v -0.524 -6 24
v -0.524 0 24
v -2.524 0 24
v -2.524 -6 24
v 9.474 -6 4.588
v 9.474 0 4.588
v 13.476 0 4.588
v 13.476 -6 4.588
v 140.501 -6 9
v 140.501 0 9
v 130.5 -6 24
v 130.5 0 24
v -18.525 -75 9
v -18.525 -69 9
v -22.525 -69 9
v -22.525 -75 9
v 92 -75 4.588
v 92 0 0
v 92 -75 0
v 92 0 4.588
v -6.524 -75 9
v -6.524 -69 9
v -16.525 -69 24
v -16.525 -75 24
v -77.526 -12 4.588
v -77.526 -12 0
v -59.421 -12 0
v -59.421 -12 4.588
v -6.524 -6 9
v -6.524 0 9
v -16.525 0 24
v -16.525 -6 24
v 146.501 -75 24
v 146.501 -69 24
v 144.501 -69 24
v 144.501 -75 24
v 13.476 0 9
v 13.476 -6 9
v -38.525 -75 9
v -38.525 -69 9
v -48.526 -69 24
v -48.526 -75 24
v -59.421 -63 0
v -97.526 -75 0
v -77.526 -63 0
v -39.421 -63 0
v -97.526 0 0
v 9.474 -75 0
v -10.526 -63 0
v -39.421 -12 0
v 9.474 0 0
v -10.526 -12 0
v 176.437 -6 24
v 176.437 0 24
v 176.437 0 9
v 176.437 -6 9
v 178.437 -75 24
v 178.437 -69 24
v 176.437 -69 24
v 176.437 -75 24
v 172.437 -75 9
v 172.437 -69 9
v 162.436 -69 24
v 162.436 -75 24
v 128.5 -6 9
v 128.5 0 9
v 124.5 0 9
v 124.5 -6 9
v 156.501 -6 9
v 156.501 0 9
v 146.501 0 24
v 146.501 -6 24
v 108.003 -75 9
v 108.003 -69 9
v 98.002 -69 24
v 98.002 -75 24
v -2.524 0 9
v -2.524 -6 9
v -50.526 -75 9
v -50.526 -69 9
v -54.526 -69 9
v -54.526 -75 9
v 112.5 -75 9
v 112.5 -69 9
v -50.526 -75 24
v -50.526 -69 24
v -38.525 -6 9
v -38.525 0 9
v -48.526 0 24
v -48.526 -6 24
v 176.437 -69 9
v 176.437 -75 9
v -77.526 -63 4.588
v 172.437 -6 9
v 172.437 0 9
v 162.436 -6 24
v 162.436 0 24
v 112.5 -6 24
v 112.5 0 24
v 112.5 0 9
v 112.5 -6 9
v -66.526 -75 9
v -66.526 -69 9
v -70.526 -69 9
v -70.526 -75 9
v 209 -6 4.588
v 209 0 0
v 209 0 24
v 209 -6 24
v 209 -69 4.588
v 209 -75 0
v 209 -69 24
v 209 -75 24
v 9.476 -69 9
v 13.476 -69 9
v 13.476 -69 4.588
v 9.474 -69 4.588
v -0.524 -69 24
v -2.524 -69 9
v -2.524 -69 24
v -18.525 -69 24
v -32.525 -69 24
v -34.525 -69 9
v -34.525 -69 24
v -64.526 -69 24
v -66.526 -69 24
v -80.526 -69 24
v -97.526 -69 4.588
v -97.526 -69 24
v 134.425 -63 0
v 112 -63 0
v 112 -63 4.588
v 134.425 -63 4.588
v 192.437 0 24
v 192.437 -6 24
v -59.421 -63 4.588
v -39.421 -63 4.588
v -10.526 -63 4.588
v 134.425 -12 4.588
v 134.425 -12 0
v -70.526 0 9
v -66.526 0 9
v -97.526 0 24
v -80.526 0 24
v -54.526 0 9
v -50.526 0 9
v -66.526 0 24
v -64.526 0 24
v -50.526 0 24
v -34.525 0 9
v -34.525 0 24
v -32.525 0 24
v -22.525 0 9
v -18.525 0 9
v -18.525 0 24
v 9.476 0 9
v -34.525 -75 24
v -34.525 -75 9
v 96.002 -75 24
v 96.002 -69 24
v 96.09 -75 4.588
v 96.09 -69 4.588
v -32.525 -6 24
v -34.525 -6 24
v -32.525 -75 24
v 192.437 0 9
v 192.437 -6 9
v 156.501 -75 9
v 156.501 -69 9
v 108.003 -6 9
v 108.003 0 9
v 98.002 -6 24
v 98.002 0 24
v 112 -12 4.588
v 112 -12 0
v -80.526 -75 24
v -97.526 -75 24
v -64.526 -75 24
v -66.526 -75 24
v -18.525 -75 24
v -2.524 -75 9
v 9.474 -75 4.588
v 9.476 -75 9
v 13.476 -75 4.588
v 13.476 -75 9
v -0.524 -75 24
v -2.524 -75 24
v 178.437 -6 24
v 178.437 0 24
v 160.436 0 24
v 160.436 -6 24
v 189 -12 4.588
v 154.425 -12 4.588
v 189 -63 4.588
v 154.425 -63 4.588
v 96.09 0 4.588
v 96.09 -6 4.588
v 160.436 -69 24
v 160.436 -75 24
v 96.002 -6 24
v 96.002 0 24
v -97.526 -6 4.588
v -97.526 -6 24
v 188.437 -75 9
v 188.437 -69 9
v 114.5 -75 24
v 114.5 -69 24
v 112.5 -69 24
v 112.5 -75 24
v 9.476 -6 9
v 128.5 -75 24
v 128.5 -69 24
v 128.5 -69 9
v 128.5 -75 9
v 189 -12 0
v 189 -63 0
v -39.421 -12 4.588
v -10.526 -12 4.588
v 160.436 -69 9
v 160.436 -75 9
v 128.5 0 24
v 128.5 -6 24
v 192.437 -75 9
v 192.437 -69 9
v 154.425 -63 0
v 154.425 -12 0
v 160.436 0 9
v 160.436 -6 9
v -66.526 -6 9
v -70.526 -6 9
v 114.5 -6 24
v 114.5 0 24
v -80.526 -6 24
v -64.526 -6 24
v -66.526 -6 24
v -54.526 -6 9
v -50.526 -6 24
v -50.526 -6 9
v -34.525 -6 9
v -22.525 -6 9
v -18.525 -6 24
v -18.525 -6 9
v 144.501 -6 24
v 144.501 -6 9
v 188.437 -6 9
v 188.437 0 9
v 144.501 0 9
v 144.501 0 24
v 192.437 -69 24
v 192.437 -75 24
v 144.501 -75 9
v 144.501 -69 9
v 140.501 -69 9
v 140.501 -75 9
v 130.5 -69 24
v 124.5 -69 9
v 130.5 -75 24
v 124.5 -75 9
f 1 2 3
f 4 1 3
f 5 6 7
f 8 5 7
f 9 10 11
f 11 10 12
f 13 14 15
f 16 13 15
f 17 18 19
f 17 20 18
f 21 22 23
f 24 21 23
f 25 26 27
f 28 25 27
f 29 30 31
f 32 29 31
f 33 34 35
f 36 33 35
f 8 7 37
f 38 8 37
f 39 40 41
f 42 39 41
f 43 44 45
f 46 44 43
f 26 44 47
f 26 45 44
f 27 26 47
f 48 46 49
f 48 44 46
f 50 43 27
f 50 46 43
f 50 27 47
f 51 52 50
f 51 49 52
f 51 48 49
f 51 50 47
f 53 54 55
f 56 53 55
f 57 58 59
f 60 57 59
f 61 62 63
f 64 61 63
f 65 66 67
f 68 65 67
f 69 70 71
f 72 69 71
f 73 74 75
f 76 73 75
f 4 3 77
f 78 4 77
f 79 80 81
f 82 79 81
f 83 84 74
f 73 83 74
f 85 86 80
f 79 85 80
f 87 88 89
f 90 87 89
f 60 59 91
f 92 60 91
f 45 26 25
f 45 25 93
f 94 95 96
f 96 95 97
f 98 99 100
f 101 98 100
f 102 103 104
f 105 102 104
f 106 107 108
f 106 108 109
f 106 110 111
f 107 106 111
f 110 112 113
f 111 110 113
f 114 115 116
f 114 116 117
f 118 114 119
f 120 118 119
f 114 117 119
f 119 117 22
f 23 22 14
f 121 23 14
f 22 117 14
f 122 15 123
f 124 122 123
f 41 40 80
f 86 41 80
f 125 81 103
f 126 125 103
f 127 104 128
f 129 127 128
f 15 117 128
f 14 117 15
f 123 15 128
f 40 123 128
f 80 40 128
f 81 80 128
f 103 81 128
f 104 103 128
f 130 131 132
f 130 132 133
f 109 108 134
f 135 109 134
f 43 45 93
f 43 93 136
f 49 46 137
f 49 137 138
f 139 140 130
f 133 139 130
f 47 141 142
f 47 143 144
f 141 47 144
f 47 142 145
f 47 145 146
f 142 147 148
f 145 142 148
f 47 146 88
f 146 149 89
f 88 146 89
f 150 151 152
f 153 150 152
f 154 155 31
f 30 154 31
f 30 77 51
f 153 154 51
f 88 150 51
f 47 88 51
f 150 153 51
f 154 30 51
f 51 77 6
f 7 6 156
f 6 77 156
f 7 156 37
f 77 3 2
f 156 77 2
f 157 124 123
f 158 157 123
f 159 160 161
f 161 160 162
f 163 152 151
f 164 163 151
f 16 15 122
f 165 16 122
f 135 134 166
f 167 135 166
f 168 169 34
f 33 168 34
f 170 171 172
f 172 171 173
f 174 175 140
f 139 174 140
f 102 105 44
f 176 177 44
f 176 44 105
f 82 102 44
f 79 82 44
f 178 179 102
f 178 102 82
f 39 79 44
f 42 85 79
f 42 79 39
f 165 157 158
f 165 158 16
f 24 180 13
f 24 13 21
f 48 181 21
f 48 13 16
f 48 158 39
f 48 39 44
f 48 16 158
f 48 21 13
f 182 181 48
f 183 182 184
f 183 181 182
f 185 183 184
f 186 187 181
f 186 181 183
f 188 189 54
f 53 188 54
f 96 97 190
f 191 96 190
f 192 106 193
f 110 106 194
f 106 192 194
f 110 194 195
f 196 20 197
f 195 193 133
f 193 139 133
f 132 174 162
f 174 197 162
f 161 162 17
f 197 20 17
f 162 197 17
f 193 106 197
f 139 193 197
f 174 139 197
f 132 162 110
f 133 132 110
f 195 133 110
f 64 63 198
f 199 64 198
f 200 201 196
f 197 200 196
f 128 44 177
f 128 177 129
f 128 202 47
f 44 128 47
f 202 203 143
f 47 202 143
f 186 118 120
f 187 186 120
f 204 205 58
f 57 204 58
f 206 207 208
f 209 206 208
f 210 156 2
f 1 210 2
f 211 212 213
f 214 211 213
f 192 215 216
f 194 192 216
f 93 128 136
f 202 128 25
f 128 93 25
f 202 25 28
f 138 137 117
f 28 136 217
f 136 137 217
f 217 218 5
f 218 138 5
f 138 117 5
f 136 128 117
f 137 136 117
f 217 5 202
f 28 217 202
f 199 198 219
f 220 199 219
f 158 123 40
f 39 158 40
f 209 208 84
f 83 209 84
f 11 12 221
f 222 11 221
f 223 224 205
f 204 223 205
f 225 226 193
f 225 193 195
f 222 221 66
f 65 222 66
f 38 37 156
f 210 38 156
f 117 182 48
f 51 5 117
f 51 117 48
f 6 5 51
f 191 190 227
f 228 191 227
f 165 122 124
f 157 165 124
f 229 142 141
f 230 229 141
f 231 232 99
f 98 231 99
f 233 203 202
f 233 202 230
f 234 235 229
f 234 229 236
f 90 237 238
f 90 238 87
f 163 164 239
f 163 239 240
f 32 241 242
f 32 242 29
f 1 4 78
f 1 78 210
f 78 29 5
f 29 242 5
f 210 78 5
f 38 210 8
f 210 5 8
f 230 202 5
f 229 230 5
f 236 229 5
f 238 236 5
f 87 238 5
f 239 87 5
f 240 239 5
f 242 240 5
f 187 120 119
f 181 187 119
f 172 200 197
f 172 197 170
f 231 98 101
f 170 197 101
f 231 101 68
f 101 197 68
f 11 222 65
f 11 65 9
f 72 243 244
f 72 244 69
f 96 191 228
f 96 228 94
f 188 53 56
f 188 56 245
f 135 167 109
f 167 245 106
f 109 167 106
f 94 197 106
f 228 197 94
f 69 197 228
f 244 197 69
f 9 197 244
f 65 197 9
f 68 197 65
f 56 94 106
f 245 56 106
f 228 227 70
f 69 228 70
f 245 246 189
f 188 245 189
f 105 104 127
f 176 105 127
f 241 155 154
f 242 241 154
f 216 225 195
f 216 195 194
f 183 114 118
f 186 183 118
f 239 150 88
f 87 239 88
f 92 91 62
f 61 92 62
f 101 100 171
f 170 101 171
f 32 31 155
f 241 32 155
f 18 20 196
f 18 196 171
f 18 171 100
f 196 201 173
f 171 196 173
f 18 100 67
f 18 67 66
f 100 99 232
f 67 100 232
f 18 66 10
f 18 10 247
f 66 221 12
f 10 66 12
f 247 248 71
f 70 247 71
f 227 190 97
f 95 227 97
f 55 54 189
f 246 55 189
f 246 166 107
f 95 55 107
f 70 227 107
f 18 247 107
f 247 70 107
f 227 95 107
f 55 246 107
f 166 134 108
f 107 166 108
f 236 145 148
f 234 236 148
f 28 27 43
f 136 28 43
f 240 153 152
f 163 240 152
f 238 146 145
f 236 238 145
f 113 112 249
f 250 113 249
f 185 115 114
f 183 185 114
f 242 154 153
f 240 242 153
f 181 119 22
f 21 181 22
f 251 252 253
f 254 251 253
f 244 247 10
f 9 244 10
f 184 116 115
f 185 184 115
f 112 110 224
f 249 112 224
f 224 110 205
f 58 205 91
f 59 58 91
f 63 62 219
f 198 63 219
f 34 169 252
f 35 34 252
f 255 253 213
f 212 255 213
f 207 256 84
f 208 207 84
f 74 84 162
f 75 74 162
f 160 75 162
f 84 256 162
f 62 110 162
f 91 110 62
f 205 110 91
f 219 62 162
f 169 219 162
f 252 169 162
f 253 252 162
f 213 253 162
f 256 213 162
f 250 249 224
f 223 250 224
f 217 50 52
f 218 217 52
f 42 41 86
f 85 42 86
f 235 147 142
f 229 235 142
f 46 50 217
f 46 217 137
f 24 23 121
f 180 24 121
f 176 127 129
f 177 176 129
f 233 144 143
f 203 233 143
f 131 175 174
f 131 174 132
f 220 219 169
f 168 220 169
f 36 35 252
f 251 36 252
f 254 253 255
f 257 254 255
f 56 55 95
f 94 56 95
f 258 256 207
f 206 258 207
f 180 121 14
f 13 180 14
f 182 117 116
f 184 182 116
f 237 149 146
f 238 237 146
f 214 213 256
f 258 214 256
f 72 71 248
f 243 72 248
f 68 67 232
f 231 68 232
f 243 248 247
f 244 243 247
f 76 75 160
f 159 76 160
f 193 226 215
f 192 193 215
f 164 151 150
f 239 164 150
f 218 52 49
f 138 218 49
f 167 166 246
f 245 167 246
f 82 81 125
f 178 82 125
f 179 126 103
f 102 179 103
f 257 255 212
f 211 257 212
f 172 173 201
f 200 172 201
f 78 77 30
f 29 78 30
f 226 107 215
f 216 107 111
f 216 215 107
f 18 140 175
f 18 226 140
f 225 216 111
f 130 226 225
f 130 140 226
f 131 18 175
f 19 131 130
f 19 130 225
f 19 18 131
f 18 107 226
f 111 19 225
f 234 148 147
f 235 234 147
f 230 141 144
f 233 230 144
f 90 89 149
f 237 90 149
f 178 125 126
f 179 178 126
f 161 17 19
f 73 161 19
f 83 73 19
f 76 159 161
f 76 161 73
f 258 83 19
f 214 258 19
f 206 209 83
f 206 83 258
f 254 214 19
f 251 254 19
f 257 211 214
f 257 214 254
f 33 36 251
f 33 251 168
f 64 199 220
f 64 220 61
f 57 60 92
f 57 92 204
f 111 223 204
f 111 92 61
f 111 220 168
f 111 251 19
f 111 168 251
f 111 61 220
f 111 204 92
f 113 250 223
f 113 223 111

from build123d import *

# Parameters (mm, degrees)
F1_DEPTH  = 75
F2_W      = 199.5262856326
F2_H      = 63
F2_W_2    = 107
F3_DEPTH  = 24.001
F5_DEPTH  = 24.001
F6_W      = 63
F6_H      = 4.587566305
F7_DEPTH  = 107
F8_W      = 63
F8_H      = 4.587566305
F9_DEPTH  = 117
F12_W     = 22.4242766801
F12_H     = 51
F12_W_2   = 34.5757233199
F13_DEPTH = 24.001
F14_W     = 18.1051486874
F14_H     = 51
F14_W_2   = 28.8948513126
F15_DEPTH = 24.001


with BuildPart() as f1:
    # F0 (on Front) → F1 (new body)
    with BuildSketch(Plane.XZ):
        Polygon((-64.5259652877, 24), (-66.5259652877, 24), (-66.5259652877, 9), (-70.5259652877, 9), (-80.526317911, 24), (-97.5259652877, 24), (-97.5259652877, 0), (9.4740347123, 0), (9.4740347123, 4.587566305), (13.4762306641, 4.587566305), (13.4762306641, 9), (9.4762306641, 9), (-0.5242085263, 24), (-2.5242085263, 24), (-2.5242085263, 9), (-6.5242085263, 9), (-16.5246477167, 24), (-18.5246477167, 24), (-18.5246477167, 9), (-22.5246477167, 9), (-32.525086907, 24), (-34.525086907, 24), (-34.525086907, 9), (-38.525086907, 9), (-48.5255260974, 24), (-50.5255260974, 24), (-50.5255260974, 9), (-54.5255260974, 9), align=None)
    extrude(amount=F1_DEPTH)


with BuildPart() as f1b:
    # F0 (on Front) → F1, piece 2 (new body)
    with BuildSketch(Plane.XZ):
        Polygon((98.0021959518, 24), (96.0021959518, 24), (96.0903967895, 4.587566305), (92.0003203449, 4.587566305), (92.0003203449, 0), (209.0003203449, 0), (209.0003203449, 24), (192.4371510019, 24), (192.4371510019, 9), (188.4371510019, 9), (178.4367118115, 24), (176.4367118115, 24), (176.4367118115, 9), (172.4367118115, 9), (162.4362726212, 24), (160.4362726212, 24), (160.4362726212, 9), (156.5013175711, 9), (146.5008783807, 24), (144.5008783807, 24), (144.5008783807, 9), (140.5008783807, 9), (130.5004391904, 24), (128.5004391904, 24), (128.5004391904, 9), (124.5004391904, 9), (114.5, 24), (112.5, 24), (112.5, 9), (108.0026351421, 9), align=None)
    extrude(amount=F1_DEPTH)


with BuildPart() as f3_tool:
    # F2 (on face) → F3 (new body, through all)
    with BuildSketch(Plane(origin=(0, 0, 0), x_dir=(1, 0, 0), z_dir=(0, 0, -1))):
        with Locations((109.2371775286, 37.5)):
            Rectangle(F2_W, F2_H)
        with Locations((-44.0259652877, 37.5)):
            Rectangle(F2_W_2, F2_H)
    extrude(amount=-F3_DEPTH)


with BuildPart() as f1_1:
    add(f1.part)

    # F3: cut by f3_tool
    add(f3_tool.part, mode=Mode.SUBTRACT)

    # F4 (on face) → F5 (cut, through all)
    with BuildSketch(Plane(origin=(0, 0, 0), x_dir=(1, 0, 0), z_dir=(0, 0, -1))):
        Polygon((13.4762306641, 6), (13.4762306641, 69), (9.4740347123, 69), (-97.5259652877, 69), (-97.5259652877, 6), (9.4740347123, 6), align=None)
    extrude(amount=-F5_DEPTH, mode=Mode.SUBTRACT)


with BuildPart() as f1b_1:
    add(f1b.part)

    # F3: cut by f3_tool
    add(f3_tool.part, mode=Mode.SUBTRACT)


with BuildPart() as f7:
    # F6 (on face) → F7 (new body)
    with BuildSketch(Plane.YZ.offset(9.4740347123)):
        with Locations((-37.5, 2.2937831525)):
            Rectangle(F6_W, F6_H)
    extrude(amount=-F7_DEPTH)


with BuildPart() as f9:
    # F8 (on face) → F9 (new body)
    with BuildSketch(Plane(origin=(92.0003203449, 0, 0), x_dir=(0, -1, 0), z_dir=(-1, 0, 0))):
        with Locations((37.5, 2.2937831525)):
            Rectangle(F8_W, F8_H)
    extrude(amount=-F9_DEPTH)


with BuildPart() as f1b_2:
    add(f1b_1.part)

    # F10: union F9
    add(f9.part)

    # F12 (on face) → F13 (cut, through all)
    with BuildSketch(Plane(origin=(0, 0, 0), x_dir=(1, 0, 0), z_dir=(0, 0, -1))):
        with Locations((123.2124586849, 37.5)):
            Rectangle(F12_W, F12_H)
        with Locations((171.7124586849, 37.5)):
            Rectangle(F12_W_2, F12_H)
    extrude(amount=-F13_DEPTH, mode=Mode.SUBTRACT)


with BuildPart() as f1_2:
    add(f1_1.part)

    # F11: union F7
    add(f7.part)

    # F14 (on face) → F15 (cut, through all)
    with BuildSketch(Plane(origin=(0, 0, 0), x_dir=(1, 0, 0), z_dir=(0, 0, -1))):
        with Locations((-68.473390944, 37.5)):
            Rectangle(F14_W, F14_H)
        with Locations((-24.973390944, 37.5)):
            Rectangle(F14_W_2, F14_H)
    extrude(amount=-F15_DEPTH, mode=Mode.SUBTRACT)


solid = Compound([f1b_2.part, f1_2.part])
